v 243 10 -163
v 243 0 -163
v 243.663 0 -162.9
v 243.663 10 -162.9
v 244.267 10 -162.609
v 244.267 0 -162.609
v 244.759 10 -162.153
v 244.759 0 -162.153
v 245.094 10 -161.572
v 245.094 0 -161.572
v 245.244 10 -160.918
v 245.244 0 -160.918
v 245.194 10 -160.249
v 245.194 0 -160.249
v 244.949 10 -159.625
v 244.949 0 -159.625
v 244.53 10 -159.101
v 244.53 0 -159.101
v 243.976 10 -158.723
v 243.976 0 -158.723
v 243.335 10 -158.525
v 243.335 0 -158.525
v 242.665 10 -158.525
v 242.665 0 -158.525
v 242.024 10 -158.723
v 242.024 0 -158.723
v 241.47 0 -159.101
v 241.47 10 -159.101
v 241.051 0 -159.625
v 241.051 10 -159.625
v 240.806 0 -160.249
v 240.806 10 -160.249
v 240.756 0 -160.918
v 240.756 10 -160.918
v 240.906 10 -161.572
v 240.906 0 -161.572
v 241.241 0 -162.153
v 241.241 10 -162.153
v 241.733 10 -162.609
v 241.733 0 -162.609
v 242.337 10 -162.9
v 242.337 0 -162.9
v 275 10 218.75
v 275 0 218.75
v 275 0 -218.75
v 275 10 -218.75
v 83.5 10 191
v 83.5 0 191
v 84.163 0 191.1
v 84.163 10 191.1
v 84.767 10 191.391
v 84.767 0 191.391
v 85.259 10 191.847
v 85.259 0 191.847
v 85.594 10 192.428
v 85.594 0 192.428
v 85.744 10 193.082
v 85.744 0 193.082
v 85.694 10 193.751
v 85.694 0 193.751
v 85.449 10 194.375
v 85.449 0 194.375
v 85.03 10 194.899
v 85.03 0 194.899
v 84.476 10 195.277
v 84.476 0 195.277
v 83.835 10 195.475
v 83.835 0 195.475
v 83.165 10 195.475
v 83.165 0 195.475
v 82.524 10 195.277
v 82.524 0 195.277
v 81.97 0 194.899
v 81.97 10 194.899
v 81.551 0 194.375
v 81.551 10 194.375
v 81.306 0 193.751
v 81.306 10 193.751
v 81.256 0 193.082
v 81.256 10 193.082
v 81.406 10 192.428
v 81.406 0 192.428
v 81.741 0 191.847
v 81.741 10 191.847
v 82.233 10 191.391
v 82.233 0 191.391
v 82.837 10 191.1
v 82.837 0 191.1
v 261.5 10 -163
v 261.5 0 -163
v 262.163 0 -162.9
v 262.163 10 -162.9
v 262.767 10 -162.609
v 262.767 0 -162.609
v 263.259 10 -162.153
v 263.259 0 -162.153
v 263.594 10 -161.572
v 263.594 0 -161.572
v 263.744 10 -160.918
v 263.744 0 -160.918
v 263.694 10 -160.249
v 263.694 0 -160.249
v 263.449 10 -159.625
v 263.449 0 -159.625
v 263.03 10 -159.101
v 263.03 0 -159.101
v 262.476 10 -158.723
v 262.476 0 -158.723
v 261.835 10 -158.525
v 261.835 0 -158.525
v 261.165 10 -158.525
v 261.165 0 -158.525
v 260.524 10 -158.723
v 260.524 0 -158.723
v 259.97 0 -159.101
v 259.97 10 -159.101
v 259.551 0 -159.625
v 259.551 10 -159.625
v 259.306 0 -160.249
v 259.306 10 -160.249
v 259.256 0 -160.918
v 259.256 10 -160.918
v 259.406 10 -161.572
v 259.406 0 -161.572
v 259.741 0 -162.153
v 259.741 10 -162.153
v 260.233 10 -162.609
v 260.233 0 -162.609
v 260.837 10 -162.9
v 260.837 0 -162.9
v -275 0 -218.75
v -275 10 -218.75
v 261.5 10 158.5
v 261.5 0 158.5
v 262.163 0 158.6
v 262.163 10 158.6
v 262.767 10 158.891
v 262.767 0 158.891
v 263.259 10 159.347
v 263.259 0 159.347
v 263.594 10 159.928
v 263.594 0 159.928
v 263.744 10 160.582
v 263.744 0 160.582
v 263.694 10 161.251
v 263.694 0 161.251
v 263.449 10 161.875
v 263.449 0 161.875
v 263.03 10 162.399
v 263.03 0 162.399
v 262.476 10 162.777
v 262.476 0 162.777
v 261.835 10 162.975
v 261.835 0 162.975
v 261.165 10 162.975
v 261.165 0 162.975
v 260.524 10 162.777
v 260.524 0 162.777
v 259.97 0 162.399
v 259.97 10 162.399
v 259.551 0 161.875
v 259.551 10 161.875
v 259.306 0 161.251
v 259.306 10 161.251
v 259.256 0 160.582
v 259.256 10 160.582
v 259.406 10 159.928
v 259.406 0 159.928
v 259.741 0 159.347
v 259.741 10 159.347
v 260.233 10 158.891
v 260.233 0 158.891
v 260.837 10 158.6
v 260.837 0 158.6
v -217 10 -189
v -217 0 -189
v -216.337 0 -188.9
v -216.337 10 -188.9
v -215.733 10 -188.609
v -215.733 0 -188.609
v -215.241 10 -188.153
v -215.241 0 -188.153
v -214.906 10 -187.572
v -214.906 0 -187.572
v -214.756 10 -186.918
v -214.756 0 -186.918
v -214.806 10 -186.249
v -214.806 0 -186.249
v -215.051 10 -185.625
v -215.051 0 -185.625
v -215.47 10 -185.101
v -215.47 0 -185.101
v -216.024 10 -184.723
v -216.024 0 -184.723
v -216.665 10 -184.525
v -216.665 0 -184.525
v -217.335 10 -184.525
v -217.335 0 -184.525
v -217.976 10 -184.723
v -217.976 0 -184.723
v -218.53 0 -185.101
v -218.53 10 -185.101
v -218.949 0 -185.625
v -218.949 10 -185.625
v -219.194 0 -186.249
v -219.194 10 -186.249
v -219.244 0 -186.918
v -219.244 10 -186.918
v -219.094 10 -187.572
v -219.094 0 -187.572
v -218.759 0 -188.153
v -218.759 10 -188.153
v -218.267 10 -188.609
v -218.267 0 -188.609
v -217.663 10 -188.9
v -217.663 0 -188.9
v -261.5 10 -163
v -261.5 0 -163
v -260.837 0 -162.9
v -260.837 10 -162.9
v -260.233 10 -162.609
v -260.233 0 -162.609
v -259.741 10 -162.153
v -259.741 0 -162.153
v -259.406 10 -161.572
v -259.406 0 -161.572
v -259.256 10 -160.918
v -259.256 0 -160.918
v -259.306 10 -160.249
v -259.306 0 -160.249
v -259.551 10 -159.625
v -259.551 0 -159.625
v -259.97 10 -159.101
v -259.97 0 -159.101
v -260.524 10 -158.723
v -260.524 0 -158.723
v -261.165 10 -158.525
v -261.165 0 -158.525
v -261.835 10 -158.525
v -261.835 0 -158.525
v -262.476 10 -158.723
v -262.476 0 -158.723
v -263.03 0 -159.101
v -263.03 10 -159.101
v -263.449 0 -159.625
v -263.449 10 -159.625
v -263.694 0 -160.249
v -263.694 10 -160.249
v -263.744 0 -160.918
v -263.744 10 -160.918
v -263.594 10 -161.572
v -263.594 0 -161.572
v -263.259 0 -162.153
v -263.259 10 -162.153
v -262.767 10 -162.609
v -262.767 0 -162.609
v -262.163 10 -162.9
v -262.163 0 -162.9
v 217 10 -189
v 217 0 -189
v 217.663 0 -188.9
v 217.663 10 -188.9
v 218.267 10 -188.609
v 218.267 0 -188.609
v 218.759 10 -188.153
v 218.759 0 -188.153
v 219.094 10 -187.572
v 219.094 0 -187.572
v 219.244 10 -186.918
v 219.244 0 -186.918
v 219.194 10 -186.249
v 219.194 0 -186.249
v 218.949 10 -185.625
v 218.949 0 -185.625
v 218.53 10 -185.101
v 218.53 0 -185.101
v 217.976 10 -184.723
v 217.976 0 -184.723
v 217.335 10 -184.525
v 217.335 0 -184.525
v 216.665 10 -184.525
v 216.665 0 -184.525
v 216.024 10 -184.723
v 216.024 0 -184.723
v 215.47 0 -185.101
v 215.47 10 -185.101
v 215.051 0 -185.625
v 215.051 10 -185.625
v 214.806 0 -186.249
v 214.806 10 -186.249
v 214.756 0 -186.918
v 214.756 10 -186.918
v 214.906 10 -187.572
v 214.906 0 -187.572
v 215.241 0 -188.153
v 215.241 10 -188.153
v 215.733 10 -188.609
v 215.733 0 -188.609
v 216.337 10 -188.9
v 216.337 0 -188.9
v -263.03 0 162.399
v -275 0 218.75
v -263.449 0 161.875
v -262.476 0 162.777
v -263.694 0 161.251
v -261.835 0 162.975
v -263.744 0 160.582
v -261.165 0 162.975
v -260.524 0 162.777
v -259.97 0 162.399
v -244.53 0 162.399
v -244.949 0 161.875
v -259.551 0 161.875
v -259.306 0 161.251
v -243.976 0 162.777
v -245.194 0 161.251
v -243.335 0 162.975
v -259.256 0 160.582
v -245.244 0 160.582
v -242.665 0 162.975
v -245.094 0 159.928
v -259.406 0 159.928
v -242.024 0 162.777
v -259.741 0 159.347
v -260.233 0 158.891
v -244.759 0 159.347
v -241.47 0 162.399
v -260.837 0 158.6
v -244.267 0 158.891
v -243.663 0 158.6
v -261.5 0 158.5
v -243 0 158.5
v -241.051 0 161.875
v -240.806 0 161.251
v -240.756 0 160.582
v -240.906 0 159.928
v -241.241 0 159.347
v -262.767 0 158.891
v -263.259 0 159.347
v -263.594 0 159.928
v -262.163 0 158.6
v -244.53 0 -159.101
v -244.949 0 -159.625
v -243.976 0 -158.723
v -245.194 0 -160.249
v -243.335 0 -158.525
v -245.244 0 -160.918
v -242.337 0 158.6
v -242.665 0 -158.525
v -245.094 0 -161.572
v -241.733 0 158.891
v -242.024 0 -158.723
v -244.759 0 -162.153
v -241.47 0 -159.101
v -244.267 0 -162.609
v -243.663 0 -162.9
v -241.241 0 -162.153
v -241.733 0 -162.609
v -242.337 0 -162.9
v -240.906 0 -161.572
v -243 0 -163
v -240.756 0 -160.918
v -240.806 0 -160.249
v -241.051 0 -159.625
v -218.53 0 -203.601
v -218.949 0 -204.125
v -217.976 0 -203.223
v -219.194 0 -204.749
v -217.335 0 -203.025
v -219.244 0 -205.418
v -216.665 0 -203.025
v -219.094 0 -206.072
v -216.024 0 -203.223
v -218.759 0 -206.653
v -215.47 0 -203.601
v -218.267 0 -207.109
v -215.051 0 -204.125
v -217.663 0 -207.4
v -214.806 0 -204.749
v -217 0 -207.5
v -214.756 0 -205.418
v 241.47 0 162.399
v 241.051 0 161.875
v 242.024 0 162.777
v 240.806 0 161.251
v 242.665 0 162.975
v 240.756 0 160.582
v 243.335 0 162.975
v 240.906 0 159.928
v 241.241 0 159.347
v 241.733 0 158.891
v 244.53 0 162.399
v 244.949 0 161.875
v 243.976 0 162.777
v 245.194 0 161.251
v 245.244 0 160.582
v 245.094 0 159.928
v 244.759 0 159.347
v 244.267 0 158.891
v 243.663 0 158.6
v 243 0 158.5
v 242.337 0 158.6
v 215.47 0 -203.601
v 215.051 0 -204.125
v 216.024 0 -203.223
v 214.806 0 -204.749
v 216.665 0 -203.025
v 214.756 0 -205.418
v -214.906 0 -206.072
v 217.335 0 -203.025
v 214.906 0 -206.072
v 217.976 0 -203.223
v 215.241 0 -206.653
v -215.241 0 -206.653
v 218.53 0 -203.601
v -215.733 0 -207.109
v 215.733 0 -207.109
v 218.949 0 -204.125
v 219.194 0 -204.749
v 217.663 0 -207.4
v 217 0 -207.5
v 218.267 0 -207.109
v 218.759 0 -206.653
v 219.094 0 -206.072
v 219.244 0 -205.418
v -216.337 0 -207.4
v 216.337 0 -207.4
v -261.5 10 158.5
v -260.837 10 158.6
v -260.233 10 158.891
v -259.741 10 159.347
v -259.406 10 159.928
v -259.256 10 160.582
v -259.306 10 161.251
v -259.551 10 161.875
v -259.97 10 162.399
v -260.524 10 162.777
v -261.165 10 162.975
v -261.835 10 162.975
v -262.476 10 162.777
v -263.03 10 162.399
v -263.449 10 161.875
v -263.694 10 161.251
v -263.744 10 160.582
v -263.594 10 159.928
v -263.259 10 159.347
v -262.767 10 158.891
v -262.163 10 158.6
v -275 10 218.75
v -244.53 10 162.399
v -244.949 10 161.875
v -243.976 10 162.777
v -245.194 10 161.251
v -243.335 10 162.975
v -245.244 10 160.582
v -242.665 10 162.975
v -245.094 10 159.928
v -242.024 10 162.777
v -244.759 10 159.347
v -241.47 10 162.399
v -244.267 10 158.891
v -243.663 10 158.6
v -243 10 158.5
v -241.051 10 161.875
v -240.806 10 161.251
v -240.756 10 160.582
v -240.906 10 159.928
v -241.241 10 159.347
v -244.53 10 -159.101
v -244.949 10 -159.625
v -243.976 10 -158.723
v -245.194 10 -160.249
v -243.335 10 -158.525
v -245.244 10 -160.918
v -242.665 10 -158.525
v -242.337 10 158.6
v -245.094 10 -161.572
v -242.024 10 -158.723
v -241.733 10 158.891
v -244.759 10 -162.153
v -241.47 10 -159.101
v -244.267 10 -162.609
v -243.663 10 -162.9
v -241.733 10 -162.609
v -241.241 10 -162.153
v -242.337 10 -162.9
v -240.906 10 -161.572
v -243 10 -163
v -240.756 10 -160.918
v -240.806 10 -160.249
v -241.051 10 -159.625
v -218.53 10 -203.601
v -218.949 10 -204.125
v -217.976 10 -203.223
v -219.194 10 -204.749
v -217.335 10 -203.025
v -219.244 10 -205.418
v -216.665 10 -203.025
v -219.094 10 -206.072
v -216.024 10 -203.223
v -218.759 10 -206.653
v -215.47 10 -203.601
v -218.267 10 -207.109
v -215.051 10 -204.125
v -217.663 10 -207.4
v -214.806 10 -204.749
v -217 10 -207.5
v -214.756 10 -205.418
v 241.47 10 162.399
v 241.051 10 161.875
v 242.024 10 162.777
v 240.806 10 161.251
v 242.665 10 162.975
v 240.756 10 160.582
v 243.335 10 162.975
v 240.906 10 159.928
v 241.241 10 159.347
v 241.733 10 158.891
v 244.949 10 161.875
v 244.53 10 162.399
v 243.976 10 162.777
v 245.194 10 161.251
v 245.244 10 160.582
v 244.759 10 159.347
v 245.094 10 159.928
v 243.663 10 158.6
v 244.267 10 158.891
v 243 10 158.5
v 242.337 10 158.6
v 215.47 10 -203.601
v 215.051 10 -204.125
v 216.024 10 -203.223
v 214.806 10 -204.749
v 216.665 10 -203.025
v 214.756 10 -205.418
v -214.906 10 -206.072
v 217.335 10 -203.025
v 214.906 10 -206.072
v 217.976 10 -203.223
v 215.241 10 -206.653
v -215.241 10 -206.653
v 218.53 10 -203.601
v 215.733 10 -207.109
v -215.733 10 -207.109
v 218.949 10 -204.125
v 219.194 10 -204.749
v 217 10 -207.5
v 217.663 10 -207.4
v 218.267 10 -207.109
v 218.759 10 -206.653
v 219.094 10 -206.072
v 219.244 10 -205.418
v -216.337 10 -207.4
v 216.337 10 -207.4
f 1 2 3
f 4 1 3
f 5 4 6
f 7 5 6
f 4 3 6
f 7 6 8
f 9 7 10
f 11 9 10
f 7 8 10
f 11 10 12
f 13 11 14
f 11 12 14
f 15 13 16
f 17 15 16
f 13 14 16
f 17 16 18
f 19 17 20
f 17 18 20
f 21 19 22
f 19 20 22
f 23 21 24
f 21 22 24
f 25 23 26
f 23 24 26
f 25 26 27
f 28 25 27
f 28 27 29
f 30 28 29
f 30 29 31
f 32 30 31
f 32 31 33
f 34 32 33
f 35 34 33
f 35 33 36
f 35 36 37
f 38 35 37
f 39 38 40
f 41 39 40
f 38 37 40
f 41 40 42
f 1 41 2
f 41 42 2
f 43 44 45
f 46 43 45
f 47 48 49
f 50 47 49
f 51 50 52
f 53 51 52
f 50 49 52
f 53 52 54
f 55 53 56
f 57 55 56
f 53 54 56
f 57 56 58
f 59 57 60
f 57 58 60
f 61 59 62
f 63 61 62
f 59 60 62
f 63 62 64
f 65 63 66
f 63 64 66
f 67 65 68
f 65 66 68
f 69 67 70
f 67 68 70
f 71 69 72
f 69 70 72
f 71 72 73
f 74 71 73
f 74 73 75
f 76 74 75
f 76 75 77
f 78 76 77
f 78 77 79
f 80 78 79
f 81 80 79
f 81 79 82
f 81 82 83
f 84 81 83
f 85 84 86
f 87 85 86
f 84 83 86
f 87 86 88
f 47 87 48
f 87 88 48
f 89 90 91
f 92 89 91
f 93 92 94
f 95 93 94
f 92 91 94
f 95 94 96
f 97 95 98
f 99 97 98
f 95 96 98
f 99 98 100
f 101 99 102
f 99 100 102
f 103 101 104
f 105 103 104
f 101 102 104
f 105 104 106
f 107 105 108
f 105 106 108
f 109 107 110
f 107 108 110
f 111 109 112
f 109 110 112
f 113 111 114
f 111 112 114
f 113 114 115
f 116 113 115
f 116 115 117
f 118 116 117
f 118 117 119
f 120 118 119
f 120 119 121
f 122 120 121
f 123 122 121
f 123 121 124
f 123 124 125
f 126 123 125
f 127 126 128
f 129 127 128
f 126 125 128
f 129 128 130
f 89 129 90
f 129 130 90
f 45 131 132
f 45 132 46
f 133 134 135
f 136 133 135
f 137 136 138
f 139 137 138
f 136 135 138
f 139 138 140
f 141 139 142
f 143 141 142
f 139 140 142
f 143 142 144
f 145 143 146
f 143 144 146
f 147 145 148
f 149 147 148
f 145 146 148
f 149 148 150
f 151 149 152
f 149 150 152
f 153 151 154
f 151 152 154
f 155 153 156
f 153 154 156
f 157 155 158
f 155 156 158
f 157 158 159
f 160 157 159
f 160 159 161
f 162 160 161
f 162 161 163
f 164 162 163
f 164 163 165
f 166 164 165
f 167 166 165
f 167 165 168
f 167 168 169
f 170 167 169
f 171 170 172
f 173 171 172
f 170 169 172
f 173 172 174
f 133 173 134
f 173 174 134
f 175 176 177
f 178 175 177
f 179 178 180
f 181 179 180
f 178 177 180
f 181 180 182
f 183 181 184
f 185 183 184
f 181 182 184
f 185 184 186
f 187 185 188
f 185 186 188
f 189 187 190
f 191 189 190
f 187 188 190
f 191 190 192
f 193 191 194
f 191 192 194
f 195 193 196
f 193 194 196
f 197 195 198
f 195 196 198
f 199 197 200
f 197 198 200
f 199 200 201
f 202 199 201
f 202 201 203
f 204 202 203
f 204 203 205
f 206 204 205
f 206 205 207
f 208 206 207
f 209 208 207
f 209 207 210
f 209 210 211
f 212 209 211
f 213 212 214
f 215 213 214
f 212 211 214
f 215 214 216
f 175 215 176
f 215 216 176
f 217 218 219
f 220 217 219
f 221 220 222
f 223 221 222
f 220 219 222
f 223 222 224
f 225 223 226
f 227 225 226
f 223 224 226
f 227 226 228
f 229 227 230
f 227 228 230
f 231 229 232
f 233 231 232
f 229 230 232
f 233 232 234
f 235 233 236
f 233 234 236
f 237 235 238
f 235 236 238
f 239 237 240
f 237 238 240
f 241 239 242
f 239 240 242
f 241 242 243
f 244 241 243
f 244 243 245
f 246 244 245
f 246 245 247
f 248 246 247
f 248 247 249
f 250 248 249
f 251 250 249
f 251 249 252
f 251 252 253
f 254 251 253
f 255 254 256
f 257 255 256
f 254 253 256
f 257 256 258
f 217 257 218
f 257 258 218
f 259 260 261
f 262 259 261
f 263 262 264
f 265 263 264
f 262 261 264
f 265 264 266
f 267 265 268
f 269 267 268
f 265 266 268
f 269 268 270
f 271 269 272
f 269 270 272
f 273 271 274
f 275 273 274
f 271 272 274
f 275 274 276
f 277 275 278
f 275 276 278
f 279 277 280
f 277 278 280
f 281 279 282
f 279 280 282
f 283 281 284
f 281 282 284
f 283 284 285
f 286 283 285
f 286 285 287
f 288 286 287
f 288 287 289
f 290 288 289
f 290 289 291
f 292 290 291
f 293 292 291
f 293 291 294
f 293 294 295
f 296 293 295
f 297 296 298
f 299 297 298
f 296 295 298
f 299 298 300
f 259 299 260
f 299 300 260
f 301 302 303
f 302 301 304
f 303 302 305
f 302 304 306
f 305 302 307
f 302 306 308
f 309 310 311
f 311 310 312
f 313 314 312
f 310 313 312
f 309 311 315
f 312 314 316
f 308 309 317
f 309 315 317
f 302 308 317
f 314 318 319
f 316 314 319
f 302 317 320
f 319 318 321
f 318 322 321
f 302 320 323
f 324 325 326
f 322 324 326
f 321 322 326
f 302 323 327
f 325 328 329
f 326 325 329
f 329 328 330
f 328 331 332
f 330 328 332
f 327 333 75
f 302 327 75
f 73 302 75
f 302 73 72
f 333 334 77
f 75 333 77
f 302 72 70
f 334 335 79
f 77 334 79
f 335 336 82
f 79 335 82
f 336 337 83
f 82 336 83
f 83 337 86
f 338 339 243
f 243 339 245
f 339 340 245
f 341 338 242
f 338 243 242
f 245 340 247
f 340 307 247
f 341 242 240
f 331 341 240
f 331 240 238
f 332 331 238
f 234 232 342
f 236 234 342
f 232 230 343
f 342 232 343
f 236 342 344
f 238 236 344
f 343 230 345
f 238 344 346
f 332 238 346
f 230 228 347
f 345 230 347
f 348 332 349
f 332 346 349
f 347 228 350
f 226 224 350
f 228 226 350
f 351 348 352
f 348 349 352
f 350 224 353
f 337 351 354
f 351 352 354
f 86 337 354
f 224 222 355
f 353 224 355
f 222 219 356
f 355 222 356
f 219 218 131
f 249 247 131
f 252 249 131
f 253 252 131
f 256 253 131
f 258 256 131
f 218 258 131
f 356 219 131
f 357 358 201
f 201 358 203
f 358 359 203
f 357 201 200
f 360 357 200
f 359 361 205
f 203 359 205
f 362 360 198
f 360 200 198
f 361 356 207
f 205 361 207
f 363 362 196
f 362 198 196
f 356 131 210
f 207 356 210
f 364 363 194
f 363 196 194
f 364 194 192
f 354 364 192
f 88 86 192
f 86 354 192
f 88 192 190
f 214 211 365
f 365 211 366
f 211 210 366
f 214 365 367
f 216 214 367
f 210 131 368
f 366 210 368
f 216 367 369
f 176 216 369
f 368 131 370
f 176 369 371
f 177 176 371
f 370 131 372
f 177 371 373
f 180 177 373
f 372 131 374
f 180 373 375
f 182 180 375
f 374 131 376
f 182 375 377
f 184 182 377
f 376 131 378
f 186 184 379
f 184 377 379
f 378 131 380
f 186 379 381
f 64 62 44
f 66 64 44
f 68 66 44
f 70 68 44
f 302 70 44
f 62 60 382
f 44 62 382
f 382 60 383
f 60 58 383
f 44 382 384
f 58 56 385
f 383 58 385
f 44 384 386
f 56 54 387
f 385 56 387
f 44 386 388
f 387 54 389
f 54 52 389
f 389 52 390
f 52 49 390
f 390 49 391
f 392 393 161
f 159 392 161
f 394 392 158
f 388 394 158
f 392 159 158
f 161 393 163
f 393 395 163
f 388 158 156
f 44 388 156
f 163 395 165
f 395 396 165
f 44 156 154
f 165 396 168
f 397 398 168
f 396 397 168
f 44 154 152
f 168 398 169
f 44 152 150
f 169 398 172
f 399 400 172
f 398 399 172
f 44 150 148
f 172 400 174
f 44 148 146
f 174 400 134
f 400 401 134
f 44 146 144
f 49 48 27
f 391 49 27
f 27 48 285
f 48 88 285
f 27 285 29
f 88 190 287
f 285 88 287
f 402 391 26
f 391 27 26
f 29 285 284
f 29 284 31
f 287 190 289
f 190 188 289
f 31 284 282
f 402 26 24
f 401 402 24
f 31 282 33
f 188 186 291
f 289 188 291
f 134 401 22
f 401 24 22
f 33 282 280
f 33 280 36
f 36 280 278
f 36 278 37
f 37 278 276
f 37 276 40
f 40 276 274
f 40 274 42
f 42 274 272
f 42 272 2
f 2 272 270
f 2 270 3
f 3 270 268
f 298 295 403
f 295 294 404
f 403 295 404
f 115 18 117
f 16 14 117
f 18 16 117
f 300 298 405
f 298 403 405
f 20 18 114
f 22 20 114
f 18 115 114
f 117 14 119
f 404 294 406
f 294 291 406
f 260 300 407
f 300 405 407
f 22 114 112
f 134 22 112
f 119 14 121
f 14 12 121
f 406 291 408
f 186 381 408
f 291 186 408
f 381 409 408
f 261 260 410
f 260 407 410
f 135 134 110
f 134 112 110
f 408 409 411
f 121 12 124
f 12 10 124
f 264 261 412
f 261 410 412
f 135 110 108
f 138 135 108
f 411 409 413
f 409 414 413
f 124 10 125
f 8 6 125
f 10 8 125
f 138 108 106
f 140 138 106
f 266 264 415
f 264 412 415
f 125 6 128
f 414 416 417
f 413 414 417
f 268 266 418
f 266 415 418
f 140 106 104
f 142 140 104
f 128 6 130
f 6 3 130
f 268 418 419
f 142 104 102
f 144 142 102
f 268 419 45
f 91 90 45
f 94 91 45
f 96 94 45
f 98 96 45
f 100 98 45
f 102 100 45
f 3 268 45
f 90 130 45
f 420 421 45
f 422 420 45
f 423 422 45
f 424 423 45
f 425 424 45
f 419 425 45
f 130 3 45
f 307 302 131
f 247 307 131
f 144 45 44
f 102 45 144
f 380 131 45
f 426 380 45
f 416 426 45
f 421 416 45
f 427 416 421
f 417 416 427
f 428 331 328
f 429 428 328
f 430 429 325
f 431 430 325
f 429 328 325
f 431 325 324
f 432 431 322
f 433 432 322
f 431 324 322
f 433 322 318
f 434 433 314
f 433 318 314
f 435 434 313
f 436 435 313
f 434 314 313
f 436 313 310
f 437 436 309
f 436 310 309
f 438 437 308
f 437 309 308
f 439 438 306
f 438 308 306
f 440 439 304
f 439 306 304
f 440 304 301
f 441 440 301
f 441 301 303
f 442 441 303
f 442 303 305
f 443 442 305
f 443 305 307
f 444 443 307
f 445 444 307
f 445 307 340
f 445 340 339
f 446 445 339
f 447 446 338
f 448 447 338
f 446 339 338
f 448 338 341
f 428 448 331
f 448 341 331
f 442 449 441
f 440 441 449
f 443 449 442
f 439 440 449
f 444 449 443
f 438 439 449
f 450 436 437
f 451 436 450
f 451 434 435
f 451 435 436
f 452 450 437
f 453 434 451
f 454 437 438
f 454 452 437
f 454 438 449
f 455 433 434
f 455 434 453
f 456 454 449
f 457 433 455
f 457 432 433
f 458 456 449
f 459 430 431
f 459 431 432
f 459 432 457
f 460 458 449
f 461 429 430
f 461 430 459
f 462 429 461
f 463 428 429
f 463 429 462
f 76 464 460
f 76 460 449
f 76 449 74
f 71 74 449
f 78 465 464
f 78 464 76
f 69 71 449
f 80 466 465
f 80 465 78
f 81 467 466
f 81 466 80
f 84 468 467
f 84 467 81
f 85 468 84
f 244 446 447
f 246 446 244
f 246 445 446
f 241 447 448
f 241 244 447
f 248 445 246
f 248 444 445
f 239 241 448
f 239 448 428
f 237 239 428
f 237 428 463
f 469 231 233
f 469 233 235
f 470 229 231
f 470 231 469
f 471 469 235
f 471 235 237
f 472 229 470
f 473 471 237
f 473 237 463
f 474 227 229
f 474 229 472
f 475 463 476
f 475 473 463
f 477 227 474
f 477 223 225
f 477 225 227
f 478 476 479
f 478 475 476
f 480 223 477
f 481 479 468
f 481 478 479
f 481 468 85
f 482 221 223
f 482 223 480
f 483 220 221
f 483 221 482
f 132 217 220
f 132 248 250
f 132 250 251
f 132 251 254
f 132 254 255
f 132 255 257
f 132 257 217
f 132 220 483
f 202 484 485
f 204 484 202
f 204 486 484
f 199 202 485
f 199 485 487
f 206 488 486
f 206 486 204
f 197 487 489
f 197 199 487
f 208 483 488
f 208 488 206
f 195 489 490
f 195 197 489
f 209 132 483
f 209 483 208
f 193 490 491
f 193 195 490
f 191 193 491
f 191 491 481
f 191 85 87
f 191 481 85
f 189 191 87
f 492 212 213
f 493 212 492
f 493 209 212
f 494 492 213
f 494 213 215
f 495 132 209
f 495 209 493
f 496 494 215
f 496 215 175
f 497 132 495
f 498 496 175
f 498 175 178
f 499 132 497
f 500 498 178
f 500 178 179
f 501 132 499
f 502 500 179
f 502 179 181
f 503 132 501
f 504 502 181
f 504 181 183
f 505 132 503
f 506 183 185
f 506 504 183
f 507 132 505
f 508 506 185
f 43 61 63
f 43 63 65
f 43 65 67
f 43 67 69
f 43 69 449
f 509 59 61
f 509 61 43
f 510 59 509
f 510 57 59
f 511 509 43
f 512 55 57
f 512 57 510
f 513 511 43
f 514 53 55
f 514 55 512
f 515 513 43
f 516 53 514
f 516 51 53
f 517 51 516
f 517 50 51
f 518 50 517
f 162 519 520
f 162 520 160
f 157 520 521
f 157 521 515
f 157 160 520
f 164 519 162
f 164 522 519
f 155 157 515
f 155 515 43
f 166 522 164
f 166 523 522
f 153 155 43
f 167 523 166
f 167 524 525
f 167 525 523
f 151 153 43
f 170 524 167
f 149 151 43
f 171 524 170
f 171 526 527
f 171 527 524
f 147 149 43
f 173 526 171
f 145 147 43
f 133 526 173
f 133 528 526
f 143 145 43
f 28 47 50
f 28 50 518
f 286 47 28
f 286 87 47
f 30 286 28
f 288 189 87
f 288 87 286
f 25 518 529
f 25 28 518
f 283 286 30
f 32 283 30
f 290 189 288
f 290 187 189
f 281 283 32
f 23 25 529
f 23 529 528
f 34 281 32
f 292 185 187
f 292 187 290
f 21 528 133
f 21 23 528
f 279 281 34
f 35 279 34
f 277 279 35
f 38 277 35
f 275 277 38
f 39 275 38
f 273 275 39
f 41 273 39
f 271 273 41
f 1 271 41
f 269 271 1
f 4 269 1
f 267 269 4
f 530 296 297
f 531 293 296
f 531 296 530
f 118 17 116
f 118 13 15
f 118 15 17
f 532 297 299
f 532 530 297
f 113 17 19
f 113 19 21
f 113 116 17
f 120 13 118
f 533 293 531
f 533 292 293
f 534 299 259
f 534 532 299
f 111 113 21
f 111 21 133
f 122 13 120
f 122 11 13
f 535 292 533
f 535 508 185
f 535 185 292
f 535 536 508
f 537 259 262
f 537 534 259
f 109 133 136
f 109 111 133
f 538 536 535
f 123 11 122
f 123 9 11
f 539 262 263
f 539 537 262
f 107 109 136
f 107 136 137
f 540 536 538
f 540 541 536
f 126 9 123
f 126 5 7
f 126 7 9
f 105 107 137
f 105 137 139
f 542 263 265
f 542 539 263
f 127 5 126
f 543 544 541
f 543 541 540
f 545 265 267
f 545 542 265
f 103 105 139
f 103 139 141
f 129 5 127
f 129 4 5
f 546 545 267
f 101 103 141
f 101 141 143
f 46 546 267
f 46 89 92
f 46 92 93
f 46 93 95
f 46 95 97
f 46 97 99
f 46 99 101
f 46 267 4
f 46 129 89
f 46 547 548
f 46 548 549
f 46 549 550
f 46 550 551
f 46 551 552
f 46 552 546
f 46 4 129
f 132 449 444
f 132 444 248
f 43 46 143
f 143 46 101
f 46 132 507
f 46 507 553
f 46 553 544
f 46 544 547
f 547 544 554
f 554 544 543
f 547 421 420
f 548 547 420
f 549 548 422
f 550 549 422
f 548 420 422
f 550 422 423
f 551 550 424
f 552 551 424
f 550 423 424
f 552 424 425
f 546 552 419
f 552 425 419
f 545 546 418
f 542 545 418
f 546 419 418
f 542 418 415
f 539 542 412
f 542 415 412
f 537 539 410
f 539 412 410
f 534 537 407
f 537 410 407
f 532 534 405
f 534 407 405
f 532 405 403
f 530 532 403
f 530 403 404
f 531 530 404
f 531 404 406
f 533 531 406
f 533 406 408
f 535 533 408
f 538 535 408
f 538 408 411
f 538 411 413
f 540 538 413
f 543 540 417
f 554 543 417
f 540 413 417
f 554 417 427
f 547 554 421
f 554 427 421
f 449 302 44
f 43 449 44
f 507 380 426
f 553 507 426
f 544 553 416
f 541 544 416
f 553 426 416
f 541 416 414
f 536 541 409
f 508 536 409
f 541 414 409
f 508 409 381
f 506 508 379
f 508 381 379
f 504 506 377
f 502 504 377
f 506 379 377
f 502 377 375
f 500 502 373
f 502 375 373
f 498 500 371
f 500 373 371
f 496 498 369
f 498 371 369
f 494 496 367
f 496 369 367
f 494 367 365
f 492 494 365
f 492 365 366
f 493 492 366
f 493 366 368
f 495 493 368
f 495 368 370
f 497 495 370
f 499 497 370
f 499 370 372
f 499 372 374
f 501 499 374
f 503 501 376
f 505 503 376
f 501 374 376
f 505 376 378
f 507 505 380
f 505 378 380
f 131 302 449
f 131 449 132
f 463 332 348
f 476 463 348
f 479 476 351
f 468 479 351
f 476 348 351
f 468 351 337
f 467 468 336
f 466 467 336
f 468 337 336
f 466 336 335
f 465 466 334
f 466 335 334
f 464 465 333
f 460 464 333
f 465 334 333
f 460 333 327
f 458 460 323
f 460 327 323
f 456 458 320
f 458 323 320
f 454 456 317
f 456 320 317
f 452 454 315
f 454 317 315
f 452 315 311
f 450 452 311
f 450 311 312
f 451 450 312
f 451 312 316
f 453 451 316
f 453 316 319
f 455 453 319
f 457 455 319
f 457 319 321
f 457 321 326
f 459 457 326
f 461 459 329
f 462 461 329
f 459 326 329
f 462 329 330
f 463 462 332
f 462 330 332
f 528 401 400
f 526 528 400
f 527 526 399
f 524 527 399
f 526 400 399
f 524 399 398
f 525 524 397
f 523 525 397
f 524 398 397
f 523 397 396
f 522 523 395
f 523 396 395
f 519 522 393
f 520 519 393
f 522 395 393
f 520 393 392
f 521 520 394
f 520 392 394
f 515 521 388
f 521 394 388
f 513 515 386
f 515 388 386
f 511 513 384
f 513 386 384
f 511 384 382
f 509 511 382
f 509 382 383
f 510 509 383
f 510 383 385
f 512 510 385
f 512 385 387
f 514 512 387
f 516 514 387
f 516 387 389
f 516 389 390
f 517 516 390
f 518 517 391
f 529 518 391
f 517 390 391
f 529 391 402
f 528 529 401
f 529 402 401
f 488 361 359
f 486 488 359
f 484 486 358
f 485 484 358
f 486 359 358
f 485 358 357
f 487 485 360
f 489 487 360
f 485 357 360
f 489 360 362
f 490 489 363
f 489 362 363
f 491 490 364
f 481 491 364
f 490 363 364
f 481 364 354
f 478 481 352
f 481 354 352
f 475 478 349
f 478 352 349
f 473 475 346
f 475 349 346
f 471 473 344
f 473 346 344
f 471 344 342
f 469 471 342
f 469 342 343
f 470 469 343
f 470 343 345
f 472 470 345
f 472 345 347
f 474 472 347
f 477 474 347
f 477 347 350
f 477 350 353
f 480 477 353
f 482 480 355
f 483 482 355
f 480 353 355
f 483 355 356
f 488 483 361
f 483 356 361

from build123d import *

# Parameters (mm, degrees)
SCHIZZO1_W                   = 550
SCHIZZO1_H                   = 437.5
ESTRUSIONE_ESTRUSIONE1_DEPTH = 10
SCHIZZO2_R                   = 2.25
TAGLIO_ESTRUSIONE1_DEPTH     = 10


with BuildPart() as part:
    # Schizzo1 → Estrusione-Estrusione1 (new body)
    with BuildSketch(Plane(origin=(0, 0, 0), x_dir=(1, 0, 0), z_dir=(0, 1, 0))):
        Rectangle(SCHIZZO1_W, SCHIZZO1_H)
    extrude(amount=ESTRUSIONE_ESTRUSIONE1_DEPTH)

    # Schizzo2 → Taglio-Estrusione1 (cut)
    with BuildSketch(Plane(origin=(0, 0, 0), x_dir=(-1, 0, 0), z_dir=(0, -1, 0))):
        with Locations(Location((-217, 205.25, 0), (0, 0, 90))):
            Circle(SCHIZZO2_R)
        with Locations(Location((-217, 186.75, 0), (0, 0, 90))):
            Circle(SCHIZZO2_R)
        with Locations(Location((-243, 160.75, 0), (0, 0, 90))):
            Circle(SCHIZZO2_R)
        with Locations(Location((-261.5, 160.75, 0), (0, 0, 90))):
            Circle(SCHIZZO2_R)
        with Locations(Location((217, 205.25, 0), (0, 0, 90))):
            Circle(SCHIZZO2_R)
        with Locations(Location((217, 186.75, 0), (0, 0, 90))):
            Circle(SCHIZZO2_R)
        with Locations(Location((243, 160.75, 0), (0, 0, 90))):
            Circle(SCHIZZO2_R)
        with Locations(Location((261.5, 160.75, 0), (0, 0, 90))):
            Circle(SCHIZZO2_R)
        with Locations(Location((261.5, -160.75, 0), (0, 0, 90))):
            Circle(SCHIZZO2_R)
        with Locations(Location((243, -160.75, 0), (0, 0, 90))):
            Circle(SCHIZZO2_R)
        with Locations(Location((-261.5, -160.75, 0), (0, 0, 90))):
            Circle(SCHIZZO2_R)
        with Locations(Location((-243, -160.75, 0), (0, 0, 90))):
            Circle(SCHIZZO2_R)
        with Locations(Location((-83.5, -193.25, 0), (0, 0, 90))):
            Circle(SCHIZZO2_R)
    extrude(amount=-TAGLIO_ESTRUSIONE1_DEPTH, mode=Mode.SUBTRACT)


solid = part.part
